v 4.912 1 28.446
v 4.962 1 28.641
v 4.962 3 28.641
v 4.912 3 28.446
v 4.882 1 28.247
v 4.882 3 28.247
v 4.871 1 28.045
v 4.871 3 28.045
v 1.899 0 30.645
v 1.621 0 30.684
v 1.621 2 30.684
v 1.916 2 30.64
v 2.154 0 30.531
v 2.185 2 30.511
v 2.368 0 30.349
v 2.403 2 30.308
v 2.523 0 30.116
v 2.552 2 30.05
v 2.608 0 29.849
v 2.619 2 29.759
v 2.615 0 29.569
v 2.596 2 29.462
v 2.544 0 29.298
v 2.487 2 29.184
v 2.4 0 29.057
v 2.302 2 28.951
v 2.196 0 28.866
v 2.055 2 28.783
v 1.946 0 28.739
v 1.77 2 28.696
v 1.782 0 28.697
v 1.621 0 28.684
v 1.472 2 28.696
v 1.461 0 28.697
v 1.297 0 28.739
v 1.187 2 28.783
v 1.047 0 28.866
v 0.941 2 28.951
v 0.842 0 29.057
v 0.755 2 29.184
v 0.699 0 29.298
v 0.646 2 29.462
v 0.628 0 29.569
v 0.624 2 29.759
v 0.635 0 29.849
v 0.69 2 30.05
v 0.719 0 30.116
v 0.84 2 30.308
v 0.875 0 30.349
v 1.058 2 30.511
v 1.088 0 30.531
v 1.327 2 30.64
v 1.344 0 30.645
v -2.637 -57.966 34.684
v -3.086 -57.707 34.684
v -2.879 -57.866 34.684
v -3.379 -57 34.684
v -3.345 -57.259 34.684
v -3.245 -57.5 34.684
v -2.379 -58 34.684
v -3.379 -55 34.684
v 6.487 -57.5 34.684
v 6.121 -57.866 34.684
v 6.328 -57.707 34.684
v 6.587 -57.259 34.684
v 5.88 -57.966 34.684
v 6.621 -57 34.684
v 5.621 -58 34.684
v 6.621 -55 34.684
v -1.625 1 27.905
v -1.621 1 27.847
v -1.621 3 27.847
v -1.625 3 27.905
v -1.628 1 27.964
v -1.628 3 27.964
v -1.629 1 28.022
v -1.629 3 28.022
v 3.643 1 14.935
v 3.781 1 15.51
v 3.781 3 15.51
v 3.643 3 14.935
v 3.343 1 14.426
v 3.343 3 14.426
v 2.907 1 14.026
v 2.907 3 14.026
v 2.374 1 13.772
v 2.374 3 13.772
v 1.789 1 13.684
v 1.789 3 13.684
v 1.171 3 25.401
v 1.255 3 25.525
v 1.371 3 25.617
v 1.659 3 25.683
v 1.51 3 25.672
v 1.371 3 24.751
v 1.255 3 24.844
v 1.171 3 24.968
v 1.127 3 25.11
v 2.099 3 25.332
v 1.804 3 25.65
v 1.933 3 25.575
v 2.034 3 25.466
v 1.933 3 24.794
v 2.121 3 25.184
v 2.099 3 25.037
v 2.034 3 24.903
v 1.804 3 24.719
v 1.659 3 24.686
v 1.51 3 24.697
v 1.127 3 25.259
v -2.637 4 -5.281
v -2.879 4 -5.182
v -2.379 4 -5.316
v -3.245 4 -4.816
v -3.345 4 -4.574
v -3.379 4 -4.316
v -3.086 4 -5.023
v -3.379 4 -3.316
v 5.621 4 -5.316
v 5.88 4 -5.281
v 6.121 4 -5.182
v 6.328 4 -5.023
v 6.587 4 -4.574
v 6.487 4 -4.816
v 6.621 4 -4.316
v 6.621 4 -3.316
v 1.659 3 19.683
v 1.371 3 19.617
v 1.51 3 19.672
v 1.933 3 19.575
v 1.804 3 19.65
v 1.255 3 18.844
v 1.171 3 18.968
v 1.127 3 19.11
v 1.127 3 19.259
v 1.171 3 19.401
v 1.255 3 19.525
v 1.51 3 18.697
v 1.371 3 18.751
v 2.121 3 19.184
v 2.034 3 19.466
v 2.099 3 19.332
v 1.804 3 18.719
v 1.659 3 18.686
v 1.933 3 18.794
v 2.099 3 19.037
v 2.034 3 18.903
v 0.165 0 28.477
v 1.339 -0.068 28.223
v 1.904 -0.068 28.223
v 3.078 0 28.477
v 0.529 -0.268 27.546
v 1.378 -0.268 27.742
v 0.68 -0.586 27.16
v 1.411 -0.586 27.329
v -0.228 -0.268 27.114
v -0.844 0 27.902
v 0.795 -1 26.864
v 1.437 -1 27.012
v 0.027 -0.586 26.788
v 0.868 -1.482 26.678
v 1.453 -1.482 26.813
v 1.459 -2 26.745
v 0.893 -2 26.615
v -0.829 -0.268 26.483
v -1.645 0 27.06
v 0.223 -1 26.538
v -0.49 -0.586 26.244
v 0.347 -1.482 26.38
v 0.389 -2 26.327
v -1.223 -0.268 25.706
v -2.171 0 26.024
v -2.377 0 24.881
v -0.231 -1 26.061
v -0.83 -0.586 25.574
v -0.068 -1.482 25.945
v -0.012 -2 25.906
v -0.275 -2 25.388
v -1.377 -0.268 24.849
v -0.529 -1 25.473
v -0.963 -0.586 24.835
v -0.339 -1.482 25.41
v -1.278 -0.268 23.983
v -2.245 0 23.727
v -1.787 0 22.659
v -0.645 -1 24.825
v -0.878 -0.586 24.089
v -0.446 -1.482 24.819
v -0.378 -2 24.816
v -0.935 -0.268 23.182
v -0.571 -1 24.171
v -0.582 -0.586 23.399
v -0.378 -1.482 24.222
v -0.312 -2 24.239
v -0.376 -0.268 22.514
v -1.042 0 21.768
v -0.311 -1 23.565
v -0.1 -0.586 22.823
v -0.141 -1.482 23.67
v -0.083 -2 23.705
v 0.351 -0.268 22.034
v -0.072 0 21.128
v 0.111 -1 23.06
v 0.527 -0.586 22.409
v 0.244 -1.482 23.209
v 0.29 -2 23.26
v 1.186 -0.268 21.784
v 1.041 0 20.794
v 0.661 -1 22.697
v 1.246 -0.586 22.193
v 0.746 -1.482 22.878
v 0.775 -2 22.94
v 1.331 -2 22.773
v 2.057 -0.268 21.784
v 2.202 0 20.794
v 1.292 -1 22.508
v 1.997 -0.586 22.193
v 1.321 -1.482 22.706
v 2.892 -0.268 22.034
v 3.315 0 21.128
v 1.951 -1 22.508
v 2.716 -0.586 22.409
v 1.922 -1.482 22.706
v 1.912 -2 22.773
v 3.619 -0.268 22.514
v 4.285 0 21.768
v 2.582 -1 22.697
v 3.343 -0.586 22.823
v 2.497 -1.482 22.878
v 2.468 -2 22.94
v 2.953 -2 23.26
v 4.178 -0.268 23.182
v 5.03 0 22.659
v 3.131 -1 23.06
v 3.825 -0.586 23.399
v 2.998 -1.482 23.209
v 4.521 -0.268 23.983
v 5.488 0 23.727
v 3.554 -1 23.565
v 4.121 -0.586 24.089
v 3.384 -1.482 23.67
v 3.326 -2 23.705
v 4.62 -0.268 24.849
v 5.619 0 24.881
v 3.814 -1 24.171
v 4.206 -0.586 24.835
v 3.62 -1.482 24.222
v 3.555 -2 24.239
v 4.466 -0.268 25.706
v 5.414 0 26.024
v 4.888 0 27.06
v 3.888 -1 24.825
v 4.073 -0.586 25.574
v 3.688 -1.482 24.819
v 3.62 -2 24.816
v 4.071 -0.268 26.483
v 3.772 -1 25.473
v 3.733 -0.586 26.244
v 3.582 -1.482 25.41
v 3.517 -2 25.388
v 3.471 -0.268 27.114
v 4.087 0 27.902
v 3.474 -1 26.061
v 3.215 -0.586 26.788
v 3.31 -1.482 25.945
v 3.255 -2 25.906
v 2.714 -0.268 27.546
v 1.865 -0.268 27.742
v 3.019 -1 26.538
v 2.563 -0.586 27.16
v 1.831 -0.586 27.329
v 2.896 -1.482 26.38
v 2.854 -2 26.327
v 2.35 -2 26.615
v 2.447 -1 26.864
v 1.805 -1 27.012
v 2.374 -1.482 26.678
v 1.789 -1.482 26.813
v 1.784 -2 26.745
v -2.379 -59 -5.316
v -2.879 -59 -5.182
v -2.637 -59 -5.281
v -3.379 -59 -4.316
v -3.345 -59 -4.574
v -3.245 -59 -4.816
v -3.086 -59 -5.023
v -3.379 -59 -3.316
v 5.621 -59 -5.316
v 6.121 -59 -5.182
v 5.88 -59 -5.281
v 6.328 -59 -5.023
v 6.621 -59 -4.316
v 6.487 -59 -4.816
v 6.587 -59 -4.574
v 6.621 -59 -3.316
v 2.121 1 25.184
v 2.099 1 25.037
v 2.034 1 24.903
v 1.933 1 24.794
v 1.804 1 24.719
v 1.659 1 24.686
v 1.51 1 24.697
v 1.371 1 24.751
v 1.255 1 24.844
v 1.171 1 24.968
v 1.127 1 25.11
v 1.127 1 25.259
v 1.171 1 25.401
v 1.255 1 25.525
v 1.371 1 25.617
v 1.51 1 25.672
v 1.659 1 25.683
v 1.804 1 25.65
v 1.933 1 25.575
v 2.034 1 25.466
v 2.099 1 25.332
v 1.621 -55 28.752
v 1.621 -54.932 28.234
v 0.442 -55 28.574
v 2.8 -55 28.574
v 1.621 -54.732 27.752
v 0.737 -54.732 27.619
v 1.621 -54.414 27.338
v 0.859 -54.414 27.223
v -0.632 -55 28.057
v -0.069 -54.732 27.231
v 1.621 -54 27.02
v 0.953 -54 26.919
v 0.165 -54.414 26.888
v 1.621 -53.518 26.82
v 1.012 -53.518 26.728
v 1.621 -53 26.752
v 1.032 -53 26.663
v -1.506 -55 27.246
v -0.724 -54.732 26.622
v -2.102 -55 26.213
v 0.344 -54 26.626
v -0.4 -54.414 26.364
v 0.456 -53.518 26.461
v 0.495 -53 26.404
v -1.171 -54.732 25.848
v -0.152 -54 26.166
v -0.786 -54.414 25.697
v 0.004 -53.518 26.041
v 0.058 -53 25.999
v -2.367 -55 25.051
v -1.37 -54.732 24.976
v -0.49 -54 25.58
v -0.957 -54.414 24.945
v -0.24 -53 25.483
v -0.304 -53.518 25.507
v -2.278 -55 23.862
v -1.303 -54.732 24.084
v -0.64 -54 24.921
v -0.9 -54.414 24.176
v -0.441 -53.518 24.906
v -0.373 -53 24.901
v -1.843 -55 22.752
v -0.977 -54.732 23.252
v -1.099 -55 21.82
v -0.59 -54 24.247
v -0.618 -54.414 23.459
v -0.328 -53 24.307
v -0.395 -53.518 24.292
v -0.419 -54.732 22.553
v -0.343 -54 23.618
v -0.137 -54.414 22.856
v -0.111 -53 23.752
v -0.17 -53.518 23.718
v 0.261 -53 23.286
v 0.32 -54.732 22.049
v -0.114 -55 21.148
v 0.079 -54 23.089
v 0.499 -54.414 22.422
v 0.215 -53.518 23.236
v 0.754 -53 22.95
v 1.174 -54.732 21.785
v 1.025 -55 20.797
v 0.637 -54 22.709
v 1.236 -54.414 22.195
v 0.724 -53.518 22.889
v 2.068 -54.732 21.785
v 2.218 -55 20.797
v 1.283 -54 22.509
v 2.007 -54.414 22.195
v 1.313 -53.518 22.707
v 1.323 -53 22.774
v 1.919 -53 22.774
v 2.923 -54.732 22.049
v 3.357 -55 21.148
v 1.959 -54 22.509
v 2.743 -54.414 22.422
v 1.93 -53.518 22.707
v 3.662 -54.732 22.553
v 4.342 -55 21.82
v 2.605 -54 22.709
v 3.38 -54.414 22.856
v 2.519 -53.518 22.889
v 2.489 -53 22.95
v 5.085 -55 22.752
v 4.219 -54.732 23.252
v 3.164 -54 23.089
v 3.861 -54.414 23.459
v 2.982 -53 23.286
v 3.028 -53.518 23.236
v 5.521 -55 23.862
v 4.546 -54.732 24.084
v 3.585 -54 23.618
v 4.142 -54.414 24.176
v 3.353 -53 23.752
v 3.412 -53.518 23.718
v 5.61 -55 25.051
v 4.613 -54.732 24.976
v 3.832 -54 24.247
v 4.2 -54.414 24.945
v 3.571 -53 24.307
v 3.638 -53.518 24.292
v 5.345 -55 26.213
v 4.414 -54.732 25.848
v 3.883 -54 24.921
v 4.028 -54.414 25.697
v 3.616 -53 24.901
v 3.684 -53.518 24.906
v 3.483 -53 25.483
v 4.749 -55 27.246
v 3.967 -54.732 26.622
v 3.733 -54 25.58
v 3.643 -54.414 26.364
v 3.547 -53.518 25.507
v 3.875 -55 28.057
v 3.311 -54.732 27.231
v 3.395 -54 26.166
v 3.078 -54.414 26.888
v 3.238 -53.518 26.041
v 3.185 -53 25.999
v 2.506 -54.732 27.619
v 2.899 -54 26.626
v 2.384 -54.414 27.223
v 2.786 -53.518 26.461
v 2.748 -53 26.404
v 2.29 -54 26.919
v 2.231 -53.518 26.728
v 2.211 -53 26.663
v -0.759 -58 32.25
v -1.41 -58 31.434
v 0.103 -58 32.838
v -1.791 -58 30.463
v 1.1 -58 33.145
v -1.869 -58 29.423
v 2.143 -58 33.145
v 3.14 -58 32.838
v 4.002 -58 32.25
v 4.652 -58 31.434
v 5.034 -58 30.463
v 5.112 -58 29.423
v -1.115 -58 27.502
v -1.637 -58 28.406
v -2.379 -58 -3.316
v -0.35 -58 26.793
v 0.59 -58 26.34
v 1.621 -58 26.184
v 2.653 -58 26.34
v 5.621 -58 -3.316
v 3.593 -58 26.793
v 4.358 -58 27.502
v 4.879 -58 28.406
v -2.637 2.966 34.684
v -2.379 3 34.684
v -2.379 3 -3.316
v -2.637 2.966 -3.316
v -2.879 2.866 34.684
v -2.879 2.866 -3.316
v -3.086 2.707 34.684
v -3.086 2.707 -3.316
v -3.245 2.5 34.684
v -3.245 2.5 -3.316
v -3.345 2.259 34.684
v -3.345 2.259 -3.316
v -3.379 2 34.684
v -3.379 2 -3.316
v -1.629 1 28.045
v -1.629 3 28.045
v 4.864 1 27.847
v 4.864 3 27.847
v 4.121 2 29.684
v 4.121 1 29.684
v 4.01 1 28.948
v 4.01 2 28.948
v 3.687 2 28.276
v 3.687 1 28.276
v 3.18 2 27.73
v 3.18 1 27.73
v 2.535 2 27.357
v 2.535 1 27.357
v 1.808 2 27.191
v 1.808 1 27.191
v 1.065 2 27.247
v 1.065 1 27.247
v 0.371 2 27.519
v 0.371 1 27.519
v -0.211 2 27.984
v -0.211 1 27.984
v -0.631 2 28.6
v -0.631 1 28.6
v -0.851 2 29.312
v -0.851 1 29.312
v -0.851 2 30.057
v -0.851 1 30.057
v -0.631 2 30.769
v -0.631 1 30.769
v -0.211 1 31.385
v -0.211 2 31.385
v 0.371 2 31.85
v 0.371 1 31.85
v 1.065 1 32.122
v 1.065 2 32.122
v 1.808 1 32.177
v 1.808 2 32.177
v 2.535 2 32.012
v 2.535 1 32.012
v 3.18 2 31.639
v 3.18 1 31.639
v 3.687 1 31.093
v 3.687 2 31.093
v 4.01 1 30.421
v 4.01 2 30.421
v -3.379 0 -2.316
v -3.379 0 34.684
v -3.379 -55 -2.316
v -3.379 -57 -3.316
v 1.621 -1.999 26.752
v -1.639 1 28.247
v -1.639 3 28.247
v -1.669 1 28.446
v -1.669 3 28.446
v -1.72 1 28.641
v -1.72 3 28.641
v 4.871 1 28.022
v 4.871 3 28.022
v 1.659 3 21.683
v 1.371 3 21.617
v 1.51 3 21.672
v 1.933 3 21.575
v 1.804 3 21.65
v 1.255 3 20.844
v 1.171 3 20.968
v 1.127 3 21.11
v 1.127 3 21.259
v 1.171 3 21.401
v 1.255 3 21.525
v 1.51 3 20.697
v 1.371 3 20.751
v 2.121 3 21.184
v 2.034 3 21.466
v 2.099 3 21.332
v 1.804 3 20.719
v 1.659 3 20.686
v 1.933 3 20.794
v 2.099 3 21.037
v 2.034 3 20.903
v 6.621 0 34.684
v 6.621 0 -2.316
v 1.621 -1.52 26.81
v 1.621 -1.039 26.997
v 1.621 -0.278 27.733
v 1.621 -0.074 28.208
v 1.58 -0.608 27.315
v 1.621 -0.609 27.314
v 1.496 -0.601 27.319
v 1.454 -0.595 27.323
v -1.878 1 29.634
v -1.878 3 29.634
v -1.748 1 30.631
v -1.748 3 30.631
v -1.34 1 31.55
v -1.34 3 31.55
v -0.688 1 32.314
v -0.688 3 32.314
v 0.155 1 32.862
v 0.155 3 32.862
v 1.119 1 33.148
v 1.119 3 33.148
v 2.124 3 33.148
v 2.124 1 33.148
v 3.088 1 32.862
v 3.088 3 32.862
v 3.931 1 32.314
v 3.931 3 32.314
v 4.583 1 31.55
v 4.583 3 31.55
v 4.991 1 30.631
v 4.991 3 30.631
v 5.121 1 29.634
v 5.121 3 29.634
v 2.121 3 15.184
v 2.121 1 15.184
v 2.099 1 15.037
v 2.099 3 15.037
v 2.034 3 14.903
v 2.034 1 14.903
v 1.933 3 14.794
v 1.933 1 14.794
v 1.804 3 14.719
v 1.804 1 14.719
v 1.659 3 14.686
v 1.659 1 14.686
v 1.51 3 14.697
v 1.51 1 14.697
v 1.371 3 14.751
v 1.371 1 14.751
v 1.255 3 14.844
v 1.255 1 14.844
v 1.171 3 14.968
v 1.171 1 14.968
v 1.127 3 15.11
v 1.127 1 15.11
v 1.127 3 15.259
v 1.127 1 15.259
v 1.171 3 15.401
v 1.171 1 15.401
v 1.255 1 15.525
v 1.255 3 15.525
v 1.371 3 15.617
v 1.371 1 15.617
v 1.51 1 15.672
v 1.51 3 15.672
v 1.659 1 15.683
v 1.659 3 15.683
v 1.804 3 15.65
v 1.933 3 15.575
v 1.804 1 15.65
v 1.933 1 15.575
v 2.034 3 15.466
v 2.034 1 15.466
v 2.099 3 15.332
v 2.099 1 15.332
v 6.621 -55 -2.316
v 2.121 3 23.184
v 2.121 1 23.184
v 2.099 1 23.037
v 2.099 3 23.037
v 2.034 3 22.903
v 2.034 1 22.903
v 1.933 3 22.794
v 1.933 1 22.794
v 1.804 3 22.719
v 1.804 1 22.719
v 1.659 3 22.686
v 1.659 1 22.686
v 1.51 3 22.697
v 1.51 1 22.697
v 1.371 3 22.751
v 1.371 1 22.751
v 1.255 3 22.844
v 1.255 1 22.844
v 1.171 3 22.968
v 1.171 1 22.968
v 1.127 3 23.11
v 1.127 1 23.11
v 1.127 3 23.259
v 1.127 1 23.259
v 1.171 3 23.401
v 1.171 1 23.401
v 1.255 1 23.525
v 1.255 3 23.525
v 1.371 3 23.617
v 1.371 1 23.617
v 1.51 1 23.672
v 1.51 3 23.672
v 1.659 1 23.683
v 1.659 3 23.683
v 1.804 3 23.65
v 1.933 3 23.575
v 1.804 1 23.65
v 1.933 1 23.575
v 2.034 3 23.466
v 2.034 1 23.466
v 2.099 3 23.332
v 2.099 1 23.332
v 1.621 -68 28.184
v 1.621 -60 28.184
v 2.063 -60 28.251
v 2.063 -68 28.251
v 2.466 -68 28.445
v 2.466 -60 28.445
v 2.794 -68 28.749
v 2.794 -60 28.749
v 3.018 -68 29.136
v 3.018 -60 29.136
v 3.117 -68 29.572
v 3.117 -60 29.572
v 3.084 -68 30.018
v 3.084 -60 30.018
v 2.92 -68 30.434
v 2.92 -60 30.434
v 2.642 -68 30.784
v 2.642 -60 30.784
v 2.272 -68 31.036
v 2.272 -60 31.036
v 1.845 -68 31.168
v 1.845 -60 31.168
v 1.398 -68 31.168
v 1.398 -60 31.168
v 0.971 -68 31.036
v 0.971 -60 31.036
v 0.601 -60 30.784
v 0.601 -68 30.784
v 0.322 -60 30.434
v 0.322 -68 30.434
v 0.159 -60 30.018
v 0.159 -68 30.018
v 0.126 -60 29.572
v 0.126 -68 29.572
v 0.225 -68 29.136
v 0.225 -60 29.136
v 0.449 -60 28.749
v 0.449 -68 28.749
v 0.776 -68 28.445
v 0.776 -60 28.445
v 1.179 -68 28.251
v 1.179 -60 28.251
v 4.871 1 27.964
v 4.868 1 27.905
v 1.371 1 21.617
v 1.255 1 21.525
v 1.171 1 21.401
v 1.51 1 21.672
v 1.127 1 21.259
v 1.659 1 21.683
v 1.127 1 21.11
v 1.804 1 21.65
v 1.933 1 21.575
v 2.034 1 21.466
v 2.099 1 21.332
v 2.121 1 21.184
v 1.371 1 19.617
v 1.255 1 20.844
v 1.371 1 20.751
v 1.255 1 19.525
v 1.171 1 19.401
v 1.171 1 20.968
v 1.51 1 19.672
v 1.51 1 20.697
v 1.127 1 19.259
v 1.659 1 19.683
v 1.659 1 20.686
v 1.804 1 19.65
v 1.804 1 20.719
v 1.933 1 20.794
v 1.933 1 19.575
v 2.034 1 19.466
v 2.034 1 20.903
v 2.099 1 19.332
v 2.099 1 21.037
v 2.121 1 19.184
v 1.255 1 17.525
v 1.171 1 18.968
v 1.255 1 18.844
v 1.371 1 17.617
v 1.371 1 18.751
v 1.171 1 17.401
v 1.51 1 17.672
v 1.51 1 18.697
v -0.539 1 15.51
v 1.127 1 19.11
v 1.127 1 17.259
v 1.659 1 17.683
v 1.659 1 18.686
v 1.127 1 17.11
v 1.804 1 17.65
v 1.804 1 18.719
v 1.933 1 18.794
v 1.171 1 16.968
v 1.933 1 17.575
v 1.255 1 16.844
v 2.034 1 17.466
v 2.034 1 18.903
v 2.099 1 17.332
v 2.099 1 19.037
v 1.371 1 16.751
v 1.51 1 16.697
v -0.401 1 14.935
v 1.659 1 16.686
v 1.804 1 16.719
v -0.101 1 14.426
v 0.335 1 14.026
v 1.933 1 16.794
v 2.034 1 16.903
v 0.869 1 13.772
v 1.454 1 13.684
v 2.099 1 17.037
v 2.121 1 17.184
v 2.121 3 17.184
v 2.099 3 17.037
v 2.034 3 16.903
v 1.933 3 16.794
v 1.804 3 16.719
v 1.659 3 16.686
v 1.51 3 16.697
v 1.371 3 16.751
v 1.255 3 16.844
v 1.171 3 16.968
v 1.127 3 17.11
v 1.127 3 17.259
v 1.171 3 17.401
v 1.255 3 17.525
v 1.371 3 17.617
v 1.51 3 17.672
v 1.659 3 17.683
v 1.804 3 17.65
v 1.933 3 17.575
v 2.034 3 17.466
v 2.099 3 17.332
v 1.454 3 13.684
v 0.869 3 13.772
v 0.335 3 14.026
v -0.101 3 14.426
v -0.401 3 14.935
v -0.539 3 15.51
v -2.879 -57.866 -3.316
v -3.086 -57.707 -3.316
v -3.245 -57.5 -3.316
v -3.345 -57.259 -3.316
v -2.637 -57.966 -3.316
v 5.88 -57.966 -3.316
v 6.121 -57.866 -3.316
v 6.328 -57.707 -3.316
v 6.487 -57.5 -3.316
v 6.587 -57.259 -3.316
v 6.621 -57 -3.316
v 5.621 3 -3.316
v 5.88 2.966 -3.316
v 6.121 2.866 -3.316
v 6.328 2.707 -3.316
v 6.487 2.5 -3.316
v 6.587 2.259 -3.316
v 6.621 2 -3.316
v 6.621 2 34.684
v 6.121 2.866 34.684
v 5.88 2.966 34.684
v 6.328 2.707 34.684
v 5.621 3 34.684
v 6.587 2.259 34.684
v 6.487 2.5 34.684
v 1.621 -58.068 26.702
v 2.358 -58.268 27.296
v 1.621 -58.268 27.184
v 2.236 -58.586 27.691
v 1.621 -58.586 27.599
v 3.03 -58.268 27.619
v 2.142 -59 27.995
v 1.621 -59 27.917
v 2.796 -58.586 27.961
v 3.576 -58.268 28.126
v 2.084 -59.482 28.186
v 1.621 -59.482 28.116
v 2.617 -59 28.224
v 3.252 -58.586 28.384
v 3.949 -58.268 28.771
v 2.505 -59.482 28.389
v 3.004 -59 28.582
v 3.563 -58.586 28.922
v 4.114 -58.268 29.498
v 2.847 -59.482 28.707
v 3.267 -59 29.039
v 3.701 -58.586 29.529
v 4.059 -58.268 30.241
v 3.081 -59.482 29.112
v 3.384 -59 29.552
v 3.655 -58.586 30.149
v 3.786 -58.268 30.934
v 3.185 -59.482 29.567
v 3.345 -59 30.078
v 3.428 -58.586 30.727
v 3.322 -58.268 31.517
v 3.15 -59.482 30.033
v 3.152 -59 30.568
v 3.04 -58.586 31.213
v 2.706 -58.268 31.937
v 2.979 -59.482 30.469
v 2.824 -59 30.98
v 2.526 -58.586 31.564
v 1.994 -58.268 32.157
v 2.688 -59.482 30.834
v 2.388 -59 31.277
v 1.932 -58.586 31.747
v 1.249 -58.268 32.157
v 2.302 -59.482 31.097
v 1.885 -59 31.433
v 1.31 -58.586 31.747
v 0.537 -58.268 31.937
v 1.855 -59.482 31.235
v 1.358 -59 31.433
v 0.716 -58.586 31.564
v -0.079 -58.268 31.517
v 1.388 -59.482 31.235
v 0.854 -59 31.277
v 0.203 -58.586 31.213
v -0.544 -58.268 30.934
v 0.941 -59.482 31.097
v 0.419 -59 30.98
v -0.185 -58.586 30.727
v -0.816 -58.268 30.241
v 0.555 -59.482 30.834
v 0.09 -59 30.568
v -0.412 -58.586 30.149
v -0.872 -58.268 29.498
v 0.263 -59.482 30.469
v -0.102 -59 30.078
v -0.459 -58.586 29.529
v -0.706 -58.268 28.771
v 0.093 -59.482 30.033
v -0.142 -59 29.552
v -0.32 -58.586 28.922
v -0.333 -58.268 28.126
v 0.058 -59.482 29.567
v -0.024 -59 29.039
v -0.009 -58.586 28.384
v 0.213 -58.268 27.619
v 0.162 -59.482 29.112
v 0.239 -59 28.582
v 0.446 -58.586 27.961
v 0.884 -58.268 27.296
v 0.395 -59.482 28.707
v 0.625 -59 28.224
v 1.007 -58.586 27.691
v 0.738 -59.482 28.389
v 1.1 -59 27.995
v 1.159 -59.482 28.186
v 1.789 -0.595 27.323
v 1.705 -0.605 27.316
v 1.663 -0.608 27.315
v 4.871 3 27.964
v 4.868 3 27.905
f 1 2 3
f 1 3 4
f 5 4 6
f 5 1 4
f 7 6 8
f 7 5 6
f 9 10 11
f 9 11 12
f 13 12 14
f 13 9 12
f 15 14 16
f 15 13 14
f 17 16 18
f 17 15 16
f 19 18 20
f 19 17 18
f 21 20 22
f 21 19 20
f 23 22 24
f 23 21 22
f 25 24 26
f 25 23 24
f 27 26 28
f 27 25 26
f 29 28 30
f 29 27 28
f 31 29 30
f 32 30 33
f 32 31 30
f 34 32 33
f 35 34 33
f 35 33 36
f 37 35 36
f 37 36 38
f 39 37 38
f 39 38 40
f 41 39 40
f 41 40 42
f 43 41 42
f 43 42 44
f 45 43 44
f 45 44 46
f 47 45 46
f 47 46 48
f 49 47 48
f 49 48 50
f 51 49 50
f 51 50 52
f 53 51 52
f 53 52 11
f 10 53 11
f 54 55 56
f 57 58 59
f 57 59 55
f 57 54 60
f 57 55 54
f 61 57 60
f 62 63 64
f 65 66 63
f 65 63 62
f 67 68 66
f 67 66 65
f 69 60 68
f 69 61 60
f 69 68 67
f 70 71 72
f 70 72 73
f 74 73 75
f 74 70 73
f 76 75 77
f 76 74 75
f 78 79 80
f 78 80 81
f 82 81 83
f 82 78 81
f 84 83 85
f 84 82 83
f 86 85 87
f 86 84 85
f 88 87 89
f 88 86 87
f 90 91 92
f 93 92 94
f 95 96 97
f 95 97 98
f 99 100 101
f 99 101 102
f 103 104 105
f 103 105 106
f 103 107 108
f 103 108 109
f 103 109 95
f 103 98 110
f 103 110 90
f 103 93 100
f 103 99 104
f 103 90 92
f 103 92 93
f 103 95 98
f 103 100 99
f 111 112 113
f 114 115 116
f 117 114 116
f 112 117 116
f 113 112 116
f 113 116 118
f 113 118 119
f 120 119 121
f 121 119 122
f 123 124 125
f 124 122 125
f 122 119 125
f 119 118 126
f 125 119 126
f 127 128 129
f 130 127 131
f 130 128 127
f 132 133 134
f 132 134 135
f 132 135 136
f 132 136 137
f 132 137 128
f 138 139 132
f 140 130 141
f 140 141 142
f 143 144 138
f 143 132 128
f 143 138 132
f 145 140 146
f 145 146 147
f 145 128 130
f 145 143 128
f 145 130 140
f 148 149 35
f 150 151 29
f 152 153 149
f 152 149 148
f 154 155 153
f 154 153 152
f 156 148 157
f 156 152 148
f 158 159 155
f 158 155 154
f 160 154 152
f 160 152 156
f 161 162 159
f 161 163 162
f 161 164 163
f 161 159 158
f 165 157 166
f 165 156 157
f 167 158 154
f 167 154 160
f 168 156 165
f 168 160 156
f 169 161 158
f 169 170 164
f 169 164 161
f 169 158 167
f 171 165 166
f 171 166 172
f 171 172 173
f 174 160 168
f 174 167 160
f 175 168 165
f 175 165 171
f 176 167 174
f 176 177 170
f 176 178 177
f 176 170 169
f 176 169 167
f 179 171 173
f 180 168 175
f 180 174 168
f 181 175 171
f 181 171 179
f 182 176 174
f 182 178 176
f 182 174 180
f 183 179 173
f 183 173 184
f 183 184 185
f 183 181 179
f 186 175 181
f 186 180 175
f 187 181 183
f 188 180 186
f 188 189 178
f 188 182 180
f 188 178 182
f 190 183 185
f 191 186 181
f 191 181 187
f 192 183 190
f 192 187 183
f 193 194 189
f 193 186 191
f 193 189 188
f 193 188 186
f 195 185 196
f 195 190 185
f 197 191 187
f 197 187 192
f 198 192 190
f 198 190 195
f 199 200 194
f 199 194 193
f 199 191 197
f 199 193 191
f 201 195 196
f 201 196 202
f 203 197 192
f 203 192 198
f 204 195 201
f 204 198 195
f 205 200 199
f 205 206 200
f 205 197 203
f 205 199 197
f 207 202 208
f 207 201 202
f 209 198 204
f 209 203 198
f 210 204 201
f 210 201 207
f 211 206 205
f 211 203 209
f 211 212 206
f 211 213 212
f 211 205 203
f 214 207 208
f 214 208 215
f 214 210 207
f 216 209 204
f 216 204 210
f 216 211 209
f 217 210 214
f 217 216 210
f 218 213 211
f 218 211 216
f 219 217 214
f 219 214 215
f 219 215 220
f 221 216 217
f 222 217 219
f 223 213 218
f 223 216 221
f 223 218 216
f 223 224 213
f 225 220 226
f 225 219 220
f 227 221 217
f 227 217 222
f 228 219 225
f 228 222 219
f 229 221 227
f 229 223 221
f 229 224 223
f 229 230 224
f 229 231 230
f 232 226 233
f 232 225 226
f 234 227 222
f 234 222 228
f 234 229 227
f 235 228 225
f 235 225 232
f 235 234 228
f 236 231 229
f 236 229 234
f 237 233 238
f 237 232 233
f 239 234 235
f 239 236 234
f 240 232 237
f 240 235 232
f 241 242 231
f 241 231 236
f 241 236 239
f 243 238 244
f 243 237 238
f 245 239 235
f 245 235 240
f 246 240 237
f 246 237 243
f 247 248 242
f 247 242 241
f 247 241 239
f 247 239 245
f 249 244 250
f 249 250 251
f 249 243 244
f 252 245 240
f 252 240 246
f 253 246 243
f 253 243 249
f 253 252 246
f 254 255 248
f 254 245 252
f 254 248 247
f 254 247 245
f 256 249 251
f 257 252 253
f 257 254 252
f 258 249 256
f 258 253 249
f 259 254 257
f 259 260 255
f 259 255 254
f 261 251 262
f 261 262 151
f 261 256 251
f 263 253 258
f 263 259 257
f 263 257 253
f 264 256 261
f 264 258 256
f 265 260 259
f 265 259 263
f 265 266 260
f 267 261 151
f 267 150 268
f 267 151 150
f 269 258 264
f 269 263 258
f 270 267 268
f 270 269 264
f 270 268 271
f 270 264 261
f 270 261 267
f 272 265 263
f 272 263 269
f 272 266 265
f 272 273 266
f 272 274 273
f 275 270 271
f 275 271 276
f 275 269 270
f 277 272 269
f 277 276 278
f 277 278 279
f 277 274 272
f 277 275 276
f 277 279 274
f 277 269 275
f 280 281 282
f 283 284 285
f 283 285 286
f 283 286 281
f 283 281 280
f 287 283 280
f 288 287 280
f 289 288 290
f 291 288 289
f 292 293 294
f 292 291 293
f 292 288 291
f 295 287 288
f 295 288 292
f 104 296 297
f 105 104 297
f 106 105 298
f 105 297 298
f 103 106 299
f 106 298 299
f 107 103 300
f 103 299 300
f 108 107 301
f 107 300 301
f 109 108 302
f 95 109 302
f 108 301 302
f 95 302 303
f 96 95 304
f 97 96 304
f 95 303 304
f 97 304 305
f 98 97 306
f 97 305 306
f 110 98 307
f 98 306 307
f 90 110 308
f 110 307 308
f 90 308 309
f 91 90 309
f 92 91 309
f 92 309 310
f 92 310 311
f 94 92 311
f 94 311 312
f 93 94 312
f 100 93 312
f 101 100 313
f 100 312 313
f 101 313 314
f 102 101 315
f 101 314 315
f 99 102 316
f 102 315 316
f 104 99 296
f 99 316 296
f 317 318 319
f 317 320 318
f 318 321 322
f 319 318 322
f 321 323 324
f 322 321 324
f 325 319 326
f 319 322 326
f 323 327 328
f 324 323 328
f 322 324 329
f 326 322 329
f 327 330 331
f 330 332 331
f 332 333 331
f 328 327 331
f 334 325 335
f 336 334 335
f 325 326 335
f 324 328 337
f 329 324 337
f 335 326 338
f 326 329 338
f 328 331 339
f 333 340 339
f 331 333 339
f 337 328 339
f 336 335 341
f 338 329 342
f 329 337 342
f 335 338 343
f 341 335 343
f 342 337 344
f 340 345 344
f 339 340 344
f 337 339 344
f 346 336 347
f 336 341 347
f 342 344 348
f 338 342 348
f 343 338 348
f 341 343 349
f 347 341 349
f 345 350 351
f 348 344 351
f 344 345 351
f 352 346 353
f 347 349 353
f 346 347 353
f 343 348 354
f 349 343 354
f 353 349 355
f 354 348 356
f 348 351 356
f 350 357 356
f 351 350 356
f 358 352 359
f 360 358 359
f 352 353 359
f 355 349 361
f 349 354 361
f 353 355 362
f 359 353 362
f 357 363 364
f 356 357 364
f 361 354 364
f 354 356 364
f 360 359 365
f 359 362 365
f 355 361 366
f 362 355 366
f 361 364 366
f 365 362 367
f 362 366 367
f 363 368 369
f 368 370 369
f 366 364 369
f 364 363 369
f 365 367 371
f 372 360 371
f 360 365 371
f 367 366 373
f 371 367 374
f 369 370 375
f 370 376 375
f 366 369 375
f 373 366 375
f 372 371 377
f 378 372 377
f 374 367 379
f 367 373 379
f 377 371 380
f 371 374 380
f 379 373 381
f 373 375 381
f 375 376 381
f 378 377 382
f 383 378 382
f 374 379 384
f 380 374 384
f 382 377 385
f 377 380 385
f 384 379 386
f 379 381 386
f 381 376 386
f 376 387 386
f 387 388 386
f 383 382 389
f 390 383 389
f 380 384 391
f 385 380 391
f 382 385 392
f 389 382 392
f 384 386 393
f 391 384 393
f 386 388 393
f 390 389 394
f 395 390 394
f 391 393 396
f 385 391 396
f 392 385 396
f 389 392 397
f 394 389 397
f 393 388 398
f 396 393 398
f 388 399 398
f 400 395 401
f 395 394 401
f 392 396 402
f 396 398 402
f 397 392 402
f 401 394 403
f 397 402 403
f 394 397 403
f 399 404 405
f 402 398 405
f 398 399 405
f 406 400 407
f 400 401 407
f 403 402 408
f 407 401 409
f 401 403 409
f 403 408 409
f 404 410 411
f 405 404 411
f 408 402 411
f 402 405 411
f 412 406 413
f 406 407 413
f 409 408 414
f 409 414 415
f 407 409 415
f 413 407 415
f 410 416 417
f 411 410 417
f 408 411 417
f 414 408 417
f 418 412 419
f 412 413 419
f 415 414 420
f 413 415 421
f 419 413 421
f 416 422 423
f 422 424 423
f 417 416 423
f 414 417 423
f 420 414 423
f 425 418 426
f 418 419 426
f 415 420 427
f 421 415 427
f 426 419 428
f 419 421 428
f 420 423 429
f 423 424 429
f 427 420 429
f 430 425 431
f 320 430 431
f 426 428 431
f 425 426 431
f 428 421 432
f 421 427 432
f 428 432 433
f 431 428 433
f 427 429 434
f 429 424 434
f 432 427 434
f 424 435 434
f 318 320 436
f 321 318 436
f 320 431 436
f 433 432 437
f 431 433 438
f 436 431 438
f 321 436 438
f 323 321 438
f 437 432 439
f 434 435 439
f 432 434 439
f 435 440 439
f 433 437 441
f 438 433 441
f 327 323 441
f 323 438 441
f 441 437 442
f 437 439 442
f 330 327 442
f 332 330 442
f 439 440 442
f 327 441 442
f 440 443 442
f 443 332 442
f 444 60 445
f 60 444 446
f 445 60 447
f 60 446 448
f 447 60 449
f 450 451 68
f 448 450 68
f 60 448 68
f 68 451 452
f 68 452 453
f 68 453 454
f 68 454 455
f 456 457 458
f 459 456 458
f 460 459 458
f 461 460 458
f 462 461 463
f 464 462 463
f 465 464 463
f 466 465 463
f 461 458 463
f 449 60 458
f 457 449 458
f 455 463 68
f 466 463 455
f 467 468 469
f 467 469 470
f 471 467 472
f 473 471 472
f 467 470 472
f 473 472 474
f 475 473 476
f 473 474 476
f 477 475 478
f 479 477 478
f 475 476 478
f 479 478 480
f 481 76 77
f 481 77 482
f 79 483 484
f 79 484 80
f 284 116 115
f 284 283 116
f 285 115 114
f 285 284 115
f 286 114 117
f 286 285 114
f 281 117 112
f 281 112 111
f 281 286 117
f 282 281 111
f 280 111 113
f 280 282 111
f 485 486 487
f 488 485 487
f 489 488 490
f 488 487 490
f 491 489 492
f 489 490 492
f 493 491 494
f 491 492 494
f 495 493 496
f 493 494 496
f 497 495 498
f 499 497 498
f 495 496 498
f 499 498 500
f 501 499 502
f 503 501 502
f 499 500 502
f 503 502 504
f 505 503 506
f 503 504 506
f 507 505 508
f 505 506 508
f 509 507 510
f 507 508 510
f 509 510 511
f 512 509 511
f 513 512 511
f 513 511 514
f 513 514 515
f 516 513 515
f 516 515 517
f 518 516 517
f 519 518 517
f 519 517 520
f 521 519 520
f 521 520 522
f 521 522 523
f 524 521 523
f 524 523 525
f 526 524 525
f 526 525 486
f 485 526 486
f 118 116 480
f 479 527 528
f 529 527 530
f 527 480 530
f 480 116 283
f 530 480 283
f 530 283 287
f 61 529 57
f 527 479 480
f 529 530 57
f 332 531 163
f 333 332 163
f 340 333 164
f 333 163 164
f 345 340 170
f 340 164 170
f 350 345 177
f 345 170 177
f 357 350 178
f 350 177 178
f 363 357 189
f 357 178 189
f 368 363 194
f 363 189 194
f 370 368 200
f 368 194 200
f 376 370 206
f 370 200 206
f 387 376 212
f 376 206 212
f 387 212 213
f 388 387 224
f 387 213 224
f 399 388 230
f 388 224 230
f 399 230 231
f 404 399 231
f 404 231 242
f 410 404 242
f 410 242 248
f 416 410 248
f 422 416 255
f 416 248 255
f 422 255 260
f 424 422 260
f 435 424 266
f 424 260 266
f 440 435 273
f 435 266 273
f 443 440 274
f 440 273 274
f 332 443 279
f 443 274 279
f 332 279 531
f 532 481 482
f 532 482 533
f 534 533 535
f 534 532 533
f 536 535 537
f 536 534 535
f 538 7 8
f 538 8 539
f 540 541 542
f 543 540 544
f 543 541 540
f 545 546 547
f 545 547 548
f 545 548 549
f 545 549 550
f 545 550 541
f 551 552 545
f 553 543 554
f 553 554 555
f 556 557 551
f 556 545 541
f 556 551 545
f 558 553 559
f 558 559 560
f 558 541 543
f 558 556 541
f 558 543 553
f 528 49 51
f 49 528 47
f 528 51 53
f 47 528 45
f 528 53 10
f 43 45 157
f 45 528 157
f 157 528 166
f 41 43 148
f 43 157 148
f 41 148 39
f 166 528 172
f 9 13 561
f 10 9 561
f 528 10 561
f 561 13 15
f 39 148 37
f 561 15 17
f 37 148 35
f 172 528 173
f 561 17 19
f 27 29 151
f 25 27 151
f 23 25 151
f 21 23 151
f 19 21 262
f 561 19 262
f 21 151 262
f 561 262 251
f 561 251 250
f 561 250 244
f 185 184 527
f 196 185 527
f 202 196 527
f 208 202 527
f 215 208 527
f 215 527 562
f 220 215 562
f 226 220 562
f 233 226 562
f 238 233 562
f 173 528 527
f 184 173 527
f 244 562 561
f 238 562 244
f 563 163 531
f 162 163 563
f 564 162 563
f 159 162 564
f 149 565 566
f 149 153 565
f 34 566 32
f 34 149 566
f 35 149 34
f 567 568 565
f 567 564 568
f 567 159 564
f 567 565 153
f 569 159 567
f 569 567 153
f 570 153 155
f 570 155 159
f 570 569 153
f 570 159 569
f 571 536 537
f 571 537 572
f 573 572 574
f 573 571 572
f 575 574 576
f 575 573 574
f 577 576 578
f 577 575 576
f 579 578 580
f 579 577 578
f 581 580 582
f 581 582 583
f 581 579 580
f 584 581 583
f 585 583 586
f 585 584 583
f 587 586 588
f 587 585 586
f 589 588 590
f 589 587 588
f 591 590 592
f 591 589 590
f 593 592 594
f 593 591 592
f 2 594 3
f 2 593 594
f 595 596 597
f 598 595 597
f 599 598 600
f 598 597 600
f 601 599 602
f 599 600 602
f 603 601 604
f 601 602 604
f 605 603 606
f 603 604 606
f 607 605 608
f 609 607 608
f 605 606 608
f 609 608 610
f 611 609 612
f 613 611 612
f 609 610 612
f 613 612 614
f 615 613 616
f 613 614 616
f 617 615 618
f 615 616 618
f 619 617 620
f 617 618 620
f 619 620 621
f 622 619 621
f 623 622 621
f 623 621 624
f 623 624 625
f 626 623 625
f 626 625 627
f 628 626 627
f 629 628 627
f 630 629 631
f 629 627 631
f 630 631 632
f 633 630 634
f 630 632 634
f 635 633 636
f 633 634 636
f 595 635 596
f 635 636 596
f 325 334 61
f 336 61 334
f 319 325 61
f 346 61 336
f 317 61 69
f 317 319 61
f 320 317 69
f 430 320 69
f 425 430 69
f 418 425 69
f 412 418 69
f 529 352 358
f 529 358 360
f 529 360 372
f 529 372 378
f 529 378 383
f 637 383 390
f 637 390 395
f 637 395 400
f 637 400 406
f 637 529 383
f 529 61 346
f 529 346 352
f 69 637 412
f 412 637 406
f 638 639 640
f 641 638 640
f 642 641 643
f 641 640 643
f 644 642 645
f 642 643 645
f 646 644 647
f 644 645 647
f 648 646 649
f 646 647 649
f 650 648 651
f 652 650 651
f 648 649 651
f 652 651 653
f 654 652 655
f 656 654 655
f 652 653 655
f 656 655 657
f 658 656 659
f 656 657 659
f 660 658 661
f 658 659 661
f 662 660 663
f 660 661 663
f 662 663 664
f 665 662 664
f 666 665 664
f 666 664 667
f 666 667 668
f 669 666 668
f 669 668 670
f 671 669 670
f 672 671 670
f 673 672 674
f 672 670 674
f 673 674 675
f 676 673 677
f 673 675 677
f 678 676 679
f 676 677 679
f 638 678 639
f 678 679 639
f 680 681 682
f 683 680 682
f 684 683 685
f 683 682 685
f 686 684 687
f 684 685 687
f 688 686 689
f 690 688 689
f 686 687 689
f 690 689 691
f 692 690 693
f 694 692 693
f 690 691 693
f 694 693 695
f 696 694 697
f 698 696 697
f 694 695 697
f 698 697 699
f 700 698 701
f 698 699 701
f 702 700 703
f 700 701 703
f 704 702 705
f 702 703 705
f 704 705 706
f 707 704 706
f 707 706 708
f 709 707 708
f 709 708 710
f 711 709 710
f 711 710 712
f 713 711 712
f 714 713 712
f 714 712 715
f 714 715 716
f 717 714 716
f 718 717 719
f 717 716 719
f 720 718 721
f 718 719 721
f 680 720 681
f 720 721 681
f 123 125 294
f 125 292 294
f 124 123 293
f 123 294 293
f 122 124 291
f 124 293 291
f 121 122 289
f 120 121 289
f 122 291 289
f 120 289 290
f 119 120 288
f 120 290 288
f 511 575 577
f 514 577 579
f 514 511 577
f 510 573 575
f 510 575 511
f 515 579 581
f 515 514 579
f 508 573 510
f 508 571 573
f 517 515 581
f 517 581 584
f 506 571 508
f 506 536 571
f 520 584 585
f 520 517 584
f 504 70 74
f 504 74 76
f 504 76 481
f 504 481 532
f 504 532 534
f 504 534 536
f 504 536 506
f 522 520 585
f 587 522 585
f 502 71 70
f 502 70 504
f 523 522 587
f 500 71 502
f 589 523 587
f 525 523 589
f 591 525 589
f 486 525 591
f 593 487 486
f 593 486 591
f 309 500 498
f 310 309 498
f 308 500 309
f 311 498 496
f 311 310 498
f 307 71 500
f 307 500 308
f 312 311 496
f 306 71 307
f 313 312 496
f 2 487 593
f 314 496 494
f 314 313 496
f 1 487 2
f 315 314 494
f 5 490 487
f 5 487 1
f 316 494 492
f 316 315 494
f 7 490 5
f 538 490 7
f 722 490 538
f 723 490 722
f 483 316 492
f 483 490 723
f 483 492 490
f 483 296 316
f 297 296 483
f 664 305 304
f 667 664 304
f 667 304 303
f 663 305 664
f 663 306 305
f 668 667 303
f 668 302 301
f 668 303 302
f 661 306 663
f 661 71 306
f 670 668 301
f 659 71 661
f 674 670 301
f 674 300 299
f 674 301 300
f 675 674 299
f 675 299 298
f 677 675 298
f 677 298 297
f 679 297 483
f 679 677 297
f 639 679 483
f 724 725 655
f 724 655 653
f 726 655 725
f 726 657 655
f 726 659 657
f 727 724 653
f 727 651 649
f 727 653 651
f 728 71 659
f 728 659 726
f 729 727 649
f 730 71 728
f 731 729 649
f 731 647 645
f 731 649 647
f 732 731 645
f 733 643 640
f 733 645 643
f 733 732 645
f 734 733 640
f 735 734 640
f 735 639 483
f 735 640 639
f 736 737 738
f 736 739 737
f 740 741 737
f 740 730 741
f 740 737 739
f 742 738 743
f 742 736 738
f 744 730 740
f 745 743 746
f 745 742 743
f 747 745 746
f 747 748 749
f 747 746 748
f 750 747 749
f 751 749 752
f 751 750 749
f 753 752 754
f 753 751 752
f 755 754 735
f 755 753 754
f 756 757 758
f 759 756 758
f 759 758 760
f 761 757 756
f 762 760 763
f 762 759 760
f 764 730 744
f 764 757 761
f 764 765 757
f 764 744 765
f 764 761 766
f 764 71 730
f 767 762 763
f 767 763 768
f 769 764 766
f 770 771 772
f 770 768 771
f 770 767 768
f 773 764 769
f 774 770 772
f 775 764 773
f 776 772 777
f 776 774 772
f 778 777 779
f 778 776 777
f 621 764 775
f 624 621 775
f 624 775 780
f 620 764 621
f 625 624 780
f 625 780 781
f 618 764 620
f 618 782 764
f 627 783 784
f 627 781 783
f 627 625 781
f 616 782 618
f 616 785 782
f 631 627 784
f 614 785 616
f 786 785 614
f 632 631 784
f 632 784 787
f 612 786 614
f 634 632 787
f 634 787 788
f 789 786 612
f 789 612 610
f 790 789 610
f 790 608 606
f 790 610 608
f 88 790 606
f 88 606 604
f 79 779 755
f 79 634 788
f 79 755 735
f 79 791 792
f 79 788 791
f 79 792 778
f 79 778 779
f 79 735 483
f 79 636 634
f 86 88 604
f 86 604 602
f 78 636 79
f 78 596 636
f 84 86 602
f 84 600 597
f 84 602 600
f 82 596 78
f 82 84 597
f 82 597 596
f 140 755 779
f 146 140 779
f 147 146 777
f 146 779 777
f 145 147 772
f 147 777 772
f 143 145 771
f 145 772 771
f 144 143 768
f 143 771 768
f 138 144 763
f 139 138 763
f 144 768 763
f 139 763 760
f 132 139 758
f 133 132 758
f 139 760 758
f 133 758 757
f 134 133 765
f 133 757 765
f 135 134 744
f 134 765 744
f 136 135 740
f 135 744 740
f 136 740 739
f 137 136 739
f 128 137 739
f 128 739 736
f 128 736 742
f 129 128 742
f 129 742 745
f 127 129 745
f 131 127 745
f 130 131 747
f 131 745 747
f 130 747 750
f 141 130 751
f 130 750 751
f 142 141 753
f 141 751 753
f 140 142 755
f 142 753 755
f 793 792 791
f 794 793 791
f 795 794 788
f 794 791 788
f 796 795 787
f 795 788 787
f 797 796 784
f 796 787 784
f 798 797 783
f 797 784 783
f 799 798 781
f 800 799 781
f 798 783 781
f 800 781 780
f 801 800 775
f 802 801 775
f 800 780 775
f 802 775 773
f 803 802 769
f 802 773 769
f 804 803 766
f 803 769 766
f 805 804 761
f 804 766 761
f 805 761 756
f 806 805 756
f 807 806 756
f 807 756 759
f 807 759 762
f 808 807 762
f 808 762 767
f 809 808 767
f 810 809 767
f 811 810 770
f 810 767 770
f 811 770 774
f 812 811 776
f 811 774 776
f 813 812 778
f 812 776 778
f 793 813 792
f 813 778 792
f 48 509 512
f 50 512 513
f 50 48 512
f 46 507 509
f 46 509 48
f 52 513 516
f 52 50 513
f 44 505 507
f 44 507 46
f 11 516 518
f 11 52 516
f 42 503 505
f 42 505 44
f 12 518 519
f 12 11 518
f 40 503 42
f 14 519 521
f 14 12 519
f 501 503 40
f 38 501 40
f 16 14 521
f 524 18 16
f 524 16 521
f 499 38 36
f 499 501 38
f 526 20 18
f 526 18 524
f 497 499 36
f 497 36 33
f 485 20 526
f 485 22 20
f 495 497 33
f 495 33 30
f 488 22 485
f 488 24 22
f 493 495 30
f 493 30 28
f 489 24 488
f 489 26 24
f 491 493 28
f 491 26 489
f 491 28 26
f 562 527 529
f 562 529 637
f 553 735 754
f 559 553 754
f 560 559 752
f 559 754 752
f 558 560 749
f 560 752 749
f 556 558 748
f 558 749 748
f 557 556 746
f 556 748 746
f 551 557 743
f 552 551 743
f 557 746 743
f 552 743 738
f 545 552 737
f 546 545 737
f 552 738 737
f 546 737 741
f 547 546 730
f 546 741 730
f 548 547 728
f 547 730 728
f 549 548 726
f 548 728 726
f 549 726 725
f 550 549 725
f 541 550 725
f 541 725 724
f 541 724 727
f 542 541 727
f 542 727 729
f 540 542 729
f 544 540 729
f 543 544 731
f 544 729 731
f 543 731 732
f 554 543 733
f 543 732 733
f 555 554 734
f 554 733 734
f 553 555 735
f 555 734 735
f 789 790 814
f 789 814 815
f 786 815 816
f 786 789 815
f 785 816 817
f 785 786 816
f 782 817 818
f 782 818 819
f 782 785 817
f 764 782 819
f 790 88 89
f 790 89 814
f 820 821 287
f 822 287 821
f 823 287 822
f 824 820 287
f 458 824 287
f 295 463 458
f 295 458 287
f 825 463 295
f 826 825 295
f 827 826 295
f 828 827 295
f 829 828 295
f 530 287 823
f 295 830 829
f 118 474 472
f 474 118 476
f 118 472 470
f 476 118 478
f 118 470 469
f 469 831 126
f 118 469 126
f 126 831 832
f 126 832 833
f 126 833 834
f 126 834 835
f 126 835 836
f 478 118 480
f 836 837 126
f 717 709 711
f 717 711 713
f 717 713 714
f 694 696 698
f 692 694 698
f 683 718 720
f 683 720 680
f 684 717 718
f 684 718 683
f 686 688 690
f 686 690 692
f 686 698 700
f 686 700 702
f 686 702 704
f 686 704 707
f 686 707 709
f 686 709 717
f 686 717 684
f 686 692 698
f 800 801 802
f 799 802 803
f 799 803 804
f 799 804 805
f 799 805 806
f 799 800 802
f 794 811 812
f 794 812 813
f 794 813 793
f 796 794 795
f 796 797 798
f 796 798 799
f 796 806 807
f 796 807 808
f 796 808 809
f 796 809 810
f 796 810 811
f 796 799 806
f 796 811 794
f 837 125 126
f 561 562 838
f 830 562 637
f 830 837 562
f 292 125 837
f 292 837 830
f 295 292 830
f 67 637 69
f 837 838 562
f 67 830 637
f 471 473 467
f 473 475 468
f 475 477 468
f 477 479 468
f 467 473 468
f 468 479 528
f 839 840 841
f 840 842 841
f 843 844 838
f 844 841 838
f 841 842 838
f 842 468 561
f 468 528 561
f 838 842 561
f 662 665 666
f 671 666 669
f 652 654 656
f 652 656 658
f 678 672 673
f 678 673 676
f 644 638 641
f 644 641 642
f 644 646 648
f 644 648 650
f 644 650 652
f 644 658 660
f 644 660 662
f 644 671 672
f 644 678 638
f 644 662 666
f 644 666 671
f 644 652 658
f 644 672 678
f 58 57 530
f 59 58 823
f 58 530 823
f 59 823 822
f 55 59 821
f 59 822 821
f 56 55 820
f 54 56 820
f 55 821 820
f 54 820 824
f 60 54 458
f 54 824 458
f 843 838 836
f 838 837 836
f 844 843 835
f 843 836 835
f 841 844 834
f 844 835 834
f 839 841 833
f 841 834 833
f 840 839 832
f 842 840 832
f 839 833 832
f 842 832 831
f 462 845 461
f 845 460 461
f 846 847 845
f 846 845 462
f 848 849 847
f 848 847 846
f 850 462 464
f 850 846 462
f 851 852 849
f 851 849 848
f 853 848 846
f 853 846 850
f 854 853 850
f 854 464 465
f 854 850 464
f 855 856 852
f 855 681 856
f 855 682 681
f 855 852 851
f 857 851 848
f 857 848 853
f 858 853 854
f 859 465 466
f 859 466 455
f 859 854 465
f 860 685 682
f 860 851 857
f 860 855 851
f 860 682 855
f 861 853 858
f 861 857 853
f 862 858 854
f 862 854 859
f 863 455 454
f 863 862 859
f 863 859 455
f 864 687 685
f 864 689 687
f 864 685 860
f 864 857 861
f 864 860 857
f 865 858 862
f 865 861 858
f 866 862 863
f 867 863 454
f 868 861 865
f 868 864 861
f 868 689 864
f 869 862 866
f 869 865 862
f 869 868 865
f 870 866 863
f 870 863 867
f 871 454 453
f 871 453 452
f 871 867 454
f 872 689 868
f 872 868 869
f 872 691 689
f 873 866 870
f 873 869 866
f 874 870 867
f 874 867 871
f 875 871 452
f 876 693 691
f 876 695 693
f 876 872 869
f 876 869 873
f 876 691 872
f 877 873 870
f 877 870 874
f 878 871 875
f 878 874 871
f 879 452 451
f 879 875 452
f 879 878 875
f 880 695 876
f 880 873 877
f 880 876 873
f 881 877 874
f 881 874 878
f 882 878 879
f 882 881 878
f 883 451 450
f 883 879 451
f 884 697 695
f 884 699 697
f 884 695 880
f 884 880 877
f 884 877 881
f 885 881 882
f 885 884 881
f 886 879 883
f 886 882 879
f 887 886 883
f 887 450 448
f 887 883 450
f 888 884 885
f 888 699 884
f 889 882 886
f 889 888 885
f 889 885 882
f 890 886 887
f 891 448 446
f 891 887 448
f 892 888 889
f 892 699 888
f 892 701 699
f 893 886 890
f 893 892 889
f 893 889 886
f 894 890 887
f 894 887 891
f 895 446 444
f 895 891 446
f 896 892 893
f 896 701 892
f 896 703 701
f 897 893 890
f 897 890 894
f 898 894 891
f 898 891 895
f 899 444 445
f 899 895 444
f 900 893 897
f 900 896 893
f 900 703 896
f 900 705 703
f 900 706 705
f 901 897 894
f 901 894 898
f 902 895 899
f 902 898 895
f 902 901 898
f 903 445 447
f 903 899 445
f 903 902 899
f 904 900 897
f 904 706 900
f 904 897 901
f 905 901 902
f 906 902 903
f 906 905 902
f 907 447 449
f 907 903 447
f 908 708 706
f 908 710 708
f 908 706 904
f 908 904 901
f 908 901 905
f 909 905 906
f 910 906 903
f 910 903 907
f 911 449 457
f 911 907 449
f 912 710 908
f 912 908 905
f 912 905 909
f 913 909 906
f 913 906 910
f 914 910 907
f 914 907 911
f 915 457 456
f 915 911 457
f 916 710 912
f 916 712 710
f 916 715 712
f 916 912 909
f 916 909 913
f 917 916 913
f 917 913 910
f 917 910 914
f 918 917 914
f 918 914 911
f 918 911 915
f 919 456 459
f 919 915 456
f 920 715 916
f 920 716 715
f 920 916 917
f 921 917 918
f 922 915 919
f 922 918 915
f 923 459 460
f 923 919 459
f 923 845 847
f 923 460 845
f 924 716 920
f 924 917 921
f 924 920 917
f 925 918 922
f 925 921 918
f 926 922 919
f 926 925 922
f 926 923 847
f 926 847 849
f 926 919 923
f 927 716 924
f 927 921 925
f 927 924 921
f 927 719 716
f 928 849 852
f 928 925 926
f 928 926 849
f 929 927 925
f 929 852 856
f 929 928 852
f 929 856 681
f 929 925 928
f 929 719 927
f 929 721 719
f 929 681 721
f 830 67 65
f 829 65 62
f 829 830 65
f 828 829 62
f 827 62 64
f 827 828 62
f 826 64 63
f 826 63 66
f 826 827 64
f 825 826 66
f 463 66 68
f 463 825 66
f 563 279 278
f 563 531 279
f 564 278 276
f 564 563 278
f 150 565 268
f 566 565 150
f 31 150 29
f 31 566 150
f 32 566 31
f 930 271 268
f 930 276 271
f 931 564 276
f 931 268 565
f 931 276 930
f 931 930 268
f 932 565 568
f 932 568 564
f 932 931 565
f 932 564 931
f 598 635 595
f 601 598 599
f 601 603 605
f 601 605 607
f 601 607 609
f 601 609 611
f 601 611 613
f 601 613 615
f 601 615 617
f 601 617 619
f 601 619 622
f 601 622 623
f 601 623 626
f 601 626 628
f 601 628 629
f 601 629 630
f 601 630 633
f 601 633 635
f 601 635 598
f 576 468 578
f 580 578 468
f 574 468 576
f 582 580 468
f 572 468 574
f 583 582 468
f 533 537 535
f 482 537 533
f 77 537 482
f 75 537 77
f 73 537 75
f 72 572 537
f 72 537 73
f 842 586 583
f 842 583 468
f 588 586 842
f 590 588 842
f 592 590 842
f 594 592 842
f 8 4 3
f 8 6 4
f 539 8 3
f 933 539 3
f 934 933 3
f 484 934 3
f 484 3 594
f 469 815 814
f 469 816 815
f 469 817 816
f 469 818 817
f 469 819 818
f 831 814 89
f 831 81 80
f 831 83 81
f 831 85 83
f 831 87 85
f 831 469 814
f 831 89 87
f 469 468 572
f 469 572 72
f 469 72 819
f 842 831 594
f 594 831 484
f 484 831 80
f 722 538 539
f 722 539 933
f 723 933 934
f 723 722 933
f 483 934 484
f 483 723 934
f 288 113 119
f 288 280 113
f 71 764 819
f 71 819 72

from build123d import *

# Parameters (mm, degrees)
SKETCH1_W             = 10
SKETCH1_H             = 40
BOSS_EXTRUDE1_DEPTH   = 3
CAVITY4_START         = 1
CAVITY4_OUTLINE_R     = 2.5
CAVITY4_OUTLINE_R_2   = 0.5
CAVITY4_DEPTH         = 2
CAVITY4_START_2       = 2
CAVITY4_2_OUTLINE_R   = 2.5
CAVITY4_2_OUTLINE_R_2 = 1
CAVITY4_2_DEPTH       = 1
CUT_EXTRUDE4_START    = -23
SKETCH5_R             = 1
CUT_EXTRUDE4_DEPTH    = 23
SKETCH7_W             = 10
SKETCH7_H             = 3
BOSS_EXTRUDE3_DEPTH   = 55
SKETCH8_R             = 1.5
BOSS_EXTRUDE4_DEPTH   = 10
SKETCH9_W             = 10
SKETCH9_H             = 2
BOSS_EXTRUDE5_DEPTH   = 1
FILLET2_R             = 1
FILLET3_R             = 1
FILLET4_R             = 2
SKETCH10_R            = 2
BOSS_EXTRUDE6_DEPTH   = 55
FILLET5_R             = 2
FILLET6_R             = 1


# Read off the part's stored shape, not the designer's step: Cavity4
with BuildPart() as part:
    # Sketch1 → Boss-Extrude1 (new body)
    with BuildSketch(Plane(origin=(0, 0, 0), x_dir=(1, 0, 0), z_dir=(0, 1, 0))):
        with Locations((1.621359223, -14.684466019)):
            Rectangle(SKETCH1_W, SKETCH1_H)
    boss_extrude1 = extrude(amount=BOSS_EXTRUDE1_DEPTH)

    # Cavity4 outline → Cavity4 (cut)
    with BuildSketch(Plane(origin=(0, 0, 0), x_dir=(1, 0, 0), z_dir=(0, 1, 0)).offset(CAVITY4_START)):
        with BuildLine():
            Line((-0.538748891, -15.509698524), (-1.620990225, -27.847249725))
            ThreePointArc((-1.620990225, -27.847249725), (-1.626727223, -27.934549786), (-1.628640777, -28.022017221))
            Line((-1.628640777, -28.022017221), (-1.628640777, -28.045106388))
            ThreePointArc((-1.628640777, -28.045106388), (-1.65149867, -28.346617733), (-1.719549868, -28.641237163))
            ThreePointArc((-1.719549868, -28.641237163), (1.621359223, -33.184466019), (4.962268314, -28.641237163))
            ThreePointArc((4.962268314, -28.641237163), (4.894217117, -28.346617733), (4.871359223, -28.045106388))
            Line((4.871359223, -28.045106388), (4.871359223, -28.022017221))
            ThreePointArc((4.871359223, -28.022017221), (4.86944567, -27.934549786), (4.863708671, -27.847249725))
            Line((4.863708671, -27.847249725), (3.781467338, -15.509698524))
            ThreePointArc((3.781467338, -15.509698524), (3.14012955, -14.209756728), (1.78911789, -13.684466019))
            Line((1.78911789, -13.684466019), (1.453600557, -13.684466019))
            ThreePointArc((1.453600557, -13.684466019), (0.102588897, -14.209756728), (-0.538748891, -15.509698524))
        make_face()
        with Locations((1.621359223, -29.684466019)):
            Circle(CAVITY4_OUTLINE_R, mode=Mode.SUBTRACT)
        with Locations((1.621359223, -25.184466019)):
            Circle(CAVITY4_OUTLINE_R_2, mode=Mode.SUBTRACT)
        with Locations((1.621359223, -23.184466019)):
            Circle(CAVITY4_OUTLINE_R_2, mode=Mode.SUBTRACT)
        with Locations((1.621359223, -21.184466019)):
            Circle(CAVITY4_OUTLINE_R_2, mode=Mode.SUBTRACT)
        with Locations((1.621359223, -19.184466019)):
            Circle(CAVITY4_OUTLINE_R_2, mode=Mode.SUBTRACT)
        with Locations((1.621359223, -17.184466019)):
            Circle(CAVITY4_OUTLINE_R_2, mode=Mode.SUBTRACT)
        with Locations((1.621359223, -15.184466019)):
            Circle(CAVITY4_OUTLINE_R_2, mode=Mode.SUBTRACT)
    extrude(amount=CAVITY4_DEPTH, mode=Mode.SUBTRACT)

    # Cavity4 2 outline → Cavity4 2 (cut)
    with BuildSketch(Plane(origin=(0, 0, 0), x_dir=(1, 0, 0), z_dir=(0, 1, 0)).offset(CAVITY4_START_2)):
        with Locations((1.621359223, -29.684466019)):
            Circle(CAVITY4_2_OUTLINE_R)
        with Locations((1.621359223, -29.684466019)):
            Circle(CAVITY4_2_OUTLINE_R_2, mode=Mode.SUBTRACT)
    extrude(amount=CAVITY4_2_DEPTH, mode=Mode.SUBTRACT)

    # Sketch5 → Cut-Extrude4 (cut)
    with BuildSketch(Plane(origin=(0, 3, 0), x_dir=(1, 0, 0), z_dir=(0, 1, 0)).offset(CUT_EXTRUDE4_START)):
        with Locations(Location((1.621359223, -29.684466019, 0), (0, 0, 270))):
            Circle(SKETCH5_R)
    extrude(amount=CUT_EXTRUDE4_DEPTH, mode=Mode.SUBTRACT)

    # Sketch7 → Boss-Extrude3 (add)
    with BuildSketch(Plane.XZ):
        with Locations((1.621359223, -3.815533981)):
            Rectangle(SKETCH7_W, SKETCH7_H)
    extrude(amount=BOSS_EXTRUDE3_DEPTH)

    # Mirror1: Boss-Extrude1 across plane
    add(boss_extrude1.mirror(Plane(origin=(0, -27.5, 0), x_dir=(0, 0, 1), z_dir=(0, -1, 0))))

    # Sketch8 → Boss-Extrude4 (add)
    with BuildSketch(Plane.XZ.offset(58)):
        with Locations(Location((1.621359223, 29.684466019, 0), (0, 0, 270))):
            Circle(SKETCH8_R)
    extrude(amount=BOSS_EXTRUDE4_DEPTH)

    # Sketch9 → Boss-Extrude5 (add)
    with BuildSketch(Plane.XZ.offset(58)):
        with Locations((1.621359223, -4.315533981)):
            Rectangle(SKETCH9_W, SKETCH9_H)
    boss_extrude5 = extrude(amount=BOSS_EXTRUDE5_DEPTH)

    # Mirror2: Boss-Extrude5 across plane
    add(boss_extrude5.mirror(Plane(origin=(0, -27.5, 0), x_dir=(0, 0, 1), z_dir=(0, -1, 0))))

    # Fillet2
    fillet2_edges = [part.edges().sort_by_distance(p)[0] for p in [
        (6.621359223, 3, 15.684466019),
        (6.621359223, -58, 15.684466019),
    ]]
    fillet(fillet2_edges, radius=FILLET2_R)

    # Fillet3
    fillet3_edges = [part.edges().sort_by_distance(p)[0] for p in [
        (-3.378640777, -58, 15.684466019),
        (-3.378640777, 3, 15.684466019),
    ]]
    fillet(fillet3_edges, radius=FILLET3_R)

    # Fillet4
    fillet4_edges = [part.edges().sort_by_distance(p)[0] for p in [
        (1.621359223, -58, 31.184466019),
    ]]
    fillet(fillet4_edges, radius=FILLET4_R)

    # Sketch10 → Boss-Extrude6 (add)
    with BuildSketch(Plane.XZ):
        with Locations(Location((1.621359223, 24.751865002, 0), (0, 0, 90))):
            Circle(SKETCH10_R)
    extrude(amount=BOSS_EXTRUDE6_DEPTH)

    # Fillet5
    fillet5_edges = [part.edges().sort_by_distance(p)[0] for p in [
        (1.621359223, -55, 22.751865002),
        (1.621359223, 0, 22.751865002),
    ]]
    fillet(fillet5_edges, radius=FILLET5_R)

    # Fillet6
    fillet6_edges = [part.edges().sort_by_distance(p)[0] for p in [
        (-3.378640777, -27.5, -5.315533981),
        (6.621359223, -27.5, -5.315533981),
    ]]
    fillet(fillet6_edges, radius=FILLET6_R)


solid = part.part
